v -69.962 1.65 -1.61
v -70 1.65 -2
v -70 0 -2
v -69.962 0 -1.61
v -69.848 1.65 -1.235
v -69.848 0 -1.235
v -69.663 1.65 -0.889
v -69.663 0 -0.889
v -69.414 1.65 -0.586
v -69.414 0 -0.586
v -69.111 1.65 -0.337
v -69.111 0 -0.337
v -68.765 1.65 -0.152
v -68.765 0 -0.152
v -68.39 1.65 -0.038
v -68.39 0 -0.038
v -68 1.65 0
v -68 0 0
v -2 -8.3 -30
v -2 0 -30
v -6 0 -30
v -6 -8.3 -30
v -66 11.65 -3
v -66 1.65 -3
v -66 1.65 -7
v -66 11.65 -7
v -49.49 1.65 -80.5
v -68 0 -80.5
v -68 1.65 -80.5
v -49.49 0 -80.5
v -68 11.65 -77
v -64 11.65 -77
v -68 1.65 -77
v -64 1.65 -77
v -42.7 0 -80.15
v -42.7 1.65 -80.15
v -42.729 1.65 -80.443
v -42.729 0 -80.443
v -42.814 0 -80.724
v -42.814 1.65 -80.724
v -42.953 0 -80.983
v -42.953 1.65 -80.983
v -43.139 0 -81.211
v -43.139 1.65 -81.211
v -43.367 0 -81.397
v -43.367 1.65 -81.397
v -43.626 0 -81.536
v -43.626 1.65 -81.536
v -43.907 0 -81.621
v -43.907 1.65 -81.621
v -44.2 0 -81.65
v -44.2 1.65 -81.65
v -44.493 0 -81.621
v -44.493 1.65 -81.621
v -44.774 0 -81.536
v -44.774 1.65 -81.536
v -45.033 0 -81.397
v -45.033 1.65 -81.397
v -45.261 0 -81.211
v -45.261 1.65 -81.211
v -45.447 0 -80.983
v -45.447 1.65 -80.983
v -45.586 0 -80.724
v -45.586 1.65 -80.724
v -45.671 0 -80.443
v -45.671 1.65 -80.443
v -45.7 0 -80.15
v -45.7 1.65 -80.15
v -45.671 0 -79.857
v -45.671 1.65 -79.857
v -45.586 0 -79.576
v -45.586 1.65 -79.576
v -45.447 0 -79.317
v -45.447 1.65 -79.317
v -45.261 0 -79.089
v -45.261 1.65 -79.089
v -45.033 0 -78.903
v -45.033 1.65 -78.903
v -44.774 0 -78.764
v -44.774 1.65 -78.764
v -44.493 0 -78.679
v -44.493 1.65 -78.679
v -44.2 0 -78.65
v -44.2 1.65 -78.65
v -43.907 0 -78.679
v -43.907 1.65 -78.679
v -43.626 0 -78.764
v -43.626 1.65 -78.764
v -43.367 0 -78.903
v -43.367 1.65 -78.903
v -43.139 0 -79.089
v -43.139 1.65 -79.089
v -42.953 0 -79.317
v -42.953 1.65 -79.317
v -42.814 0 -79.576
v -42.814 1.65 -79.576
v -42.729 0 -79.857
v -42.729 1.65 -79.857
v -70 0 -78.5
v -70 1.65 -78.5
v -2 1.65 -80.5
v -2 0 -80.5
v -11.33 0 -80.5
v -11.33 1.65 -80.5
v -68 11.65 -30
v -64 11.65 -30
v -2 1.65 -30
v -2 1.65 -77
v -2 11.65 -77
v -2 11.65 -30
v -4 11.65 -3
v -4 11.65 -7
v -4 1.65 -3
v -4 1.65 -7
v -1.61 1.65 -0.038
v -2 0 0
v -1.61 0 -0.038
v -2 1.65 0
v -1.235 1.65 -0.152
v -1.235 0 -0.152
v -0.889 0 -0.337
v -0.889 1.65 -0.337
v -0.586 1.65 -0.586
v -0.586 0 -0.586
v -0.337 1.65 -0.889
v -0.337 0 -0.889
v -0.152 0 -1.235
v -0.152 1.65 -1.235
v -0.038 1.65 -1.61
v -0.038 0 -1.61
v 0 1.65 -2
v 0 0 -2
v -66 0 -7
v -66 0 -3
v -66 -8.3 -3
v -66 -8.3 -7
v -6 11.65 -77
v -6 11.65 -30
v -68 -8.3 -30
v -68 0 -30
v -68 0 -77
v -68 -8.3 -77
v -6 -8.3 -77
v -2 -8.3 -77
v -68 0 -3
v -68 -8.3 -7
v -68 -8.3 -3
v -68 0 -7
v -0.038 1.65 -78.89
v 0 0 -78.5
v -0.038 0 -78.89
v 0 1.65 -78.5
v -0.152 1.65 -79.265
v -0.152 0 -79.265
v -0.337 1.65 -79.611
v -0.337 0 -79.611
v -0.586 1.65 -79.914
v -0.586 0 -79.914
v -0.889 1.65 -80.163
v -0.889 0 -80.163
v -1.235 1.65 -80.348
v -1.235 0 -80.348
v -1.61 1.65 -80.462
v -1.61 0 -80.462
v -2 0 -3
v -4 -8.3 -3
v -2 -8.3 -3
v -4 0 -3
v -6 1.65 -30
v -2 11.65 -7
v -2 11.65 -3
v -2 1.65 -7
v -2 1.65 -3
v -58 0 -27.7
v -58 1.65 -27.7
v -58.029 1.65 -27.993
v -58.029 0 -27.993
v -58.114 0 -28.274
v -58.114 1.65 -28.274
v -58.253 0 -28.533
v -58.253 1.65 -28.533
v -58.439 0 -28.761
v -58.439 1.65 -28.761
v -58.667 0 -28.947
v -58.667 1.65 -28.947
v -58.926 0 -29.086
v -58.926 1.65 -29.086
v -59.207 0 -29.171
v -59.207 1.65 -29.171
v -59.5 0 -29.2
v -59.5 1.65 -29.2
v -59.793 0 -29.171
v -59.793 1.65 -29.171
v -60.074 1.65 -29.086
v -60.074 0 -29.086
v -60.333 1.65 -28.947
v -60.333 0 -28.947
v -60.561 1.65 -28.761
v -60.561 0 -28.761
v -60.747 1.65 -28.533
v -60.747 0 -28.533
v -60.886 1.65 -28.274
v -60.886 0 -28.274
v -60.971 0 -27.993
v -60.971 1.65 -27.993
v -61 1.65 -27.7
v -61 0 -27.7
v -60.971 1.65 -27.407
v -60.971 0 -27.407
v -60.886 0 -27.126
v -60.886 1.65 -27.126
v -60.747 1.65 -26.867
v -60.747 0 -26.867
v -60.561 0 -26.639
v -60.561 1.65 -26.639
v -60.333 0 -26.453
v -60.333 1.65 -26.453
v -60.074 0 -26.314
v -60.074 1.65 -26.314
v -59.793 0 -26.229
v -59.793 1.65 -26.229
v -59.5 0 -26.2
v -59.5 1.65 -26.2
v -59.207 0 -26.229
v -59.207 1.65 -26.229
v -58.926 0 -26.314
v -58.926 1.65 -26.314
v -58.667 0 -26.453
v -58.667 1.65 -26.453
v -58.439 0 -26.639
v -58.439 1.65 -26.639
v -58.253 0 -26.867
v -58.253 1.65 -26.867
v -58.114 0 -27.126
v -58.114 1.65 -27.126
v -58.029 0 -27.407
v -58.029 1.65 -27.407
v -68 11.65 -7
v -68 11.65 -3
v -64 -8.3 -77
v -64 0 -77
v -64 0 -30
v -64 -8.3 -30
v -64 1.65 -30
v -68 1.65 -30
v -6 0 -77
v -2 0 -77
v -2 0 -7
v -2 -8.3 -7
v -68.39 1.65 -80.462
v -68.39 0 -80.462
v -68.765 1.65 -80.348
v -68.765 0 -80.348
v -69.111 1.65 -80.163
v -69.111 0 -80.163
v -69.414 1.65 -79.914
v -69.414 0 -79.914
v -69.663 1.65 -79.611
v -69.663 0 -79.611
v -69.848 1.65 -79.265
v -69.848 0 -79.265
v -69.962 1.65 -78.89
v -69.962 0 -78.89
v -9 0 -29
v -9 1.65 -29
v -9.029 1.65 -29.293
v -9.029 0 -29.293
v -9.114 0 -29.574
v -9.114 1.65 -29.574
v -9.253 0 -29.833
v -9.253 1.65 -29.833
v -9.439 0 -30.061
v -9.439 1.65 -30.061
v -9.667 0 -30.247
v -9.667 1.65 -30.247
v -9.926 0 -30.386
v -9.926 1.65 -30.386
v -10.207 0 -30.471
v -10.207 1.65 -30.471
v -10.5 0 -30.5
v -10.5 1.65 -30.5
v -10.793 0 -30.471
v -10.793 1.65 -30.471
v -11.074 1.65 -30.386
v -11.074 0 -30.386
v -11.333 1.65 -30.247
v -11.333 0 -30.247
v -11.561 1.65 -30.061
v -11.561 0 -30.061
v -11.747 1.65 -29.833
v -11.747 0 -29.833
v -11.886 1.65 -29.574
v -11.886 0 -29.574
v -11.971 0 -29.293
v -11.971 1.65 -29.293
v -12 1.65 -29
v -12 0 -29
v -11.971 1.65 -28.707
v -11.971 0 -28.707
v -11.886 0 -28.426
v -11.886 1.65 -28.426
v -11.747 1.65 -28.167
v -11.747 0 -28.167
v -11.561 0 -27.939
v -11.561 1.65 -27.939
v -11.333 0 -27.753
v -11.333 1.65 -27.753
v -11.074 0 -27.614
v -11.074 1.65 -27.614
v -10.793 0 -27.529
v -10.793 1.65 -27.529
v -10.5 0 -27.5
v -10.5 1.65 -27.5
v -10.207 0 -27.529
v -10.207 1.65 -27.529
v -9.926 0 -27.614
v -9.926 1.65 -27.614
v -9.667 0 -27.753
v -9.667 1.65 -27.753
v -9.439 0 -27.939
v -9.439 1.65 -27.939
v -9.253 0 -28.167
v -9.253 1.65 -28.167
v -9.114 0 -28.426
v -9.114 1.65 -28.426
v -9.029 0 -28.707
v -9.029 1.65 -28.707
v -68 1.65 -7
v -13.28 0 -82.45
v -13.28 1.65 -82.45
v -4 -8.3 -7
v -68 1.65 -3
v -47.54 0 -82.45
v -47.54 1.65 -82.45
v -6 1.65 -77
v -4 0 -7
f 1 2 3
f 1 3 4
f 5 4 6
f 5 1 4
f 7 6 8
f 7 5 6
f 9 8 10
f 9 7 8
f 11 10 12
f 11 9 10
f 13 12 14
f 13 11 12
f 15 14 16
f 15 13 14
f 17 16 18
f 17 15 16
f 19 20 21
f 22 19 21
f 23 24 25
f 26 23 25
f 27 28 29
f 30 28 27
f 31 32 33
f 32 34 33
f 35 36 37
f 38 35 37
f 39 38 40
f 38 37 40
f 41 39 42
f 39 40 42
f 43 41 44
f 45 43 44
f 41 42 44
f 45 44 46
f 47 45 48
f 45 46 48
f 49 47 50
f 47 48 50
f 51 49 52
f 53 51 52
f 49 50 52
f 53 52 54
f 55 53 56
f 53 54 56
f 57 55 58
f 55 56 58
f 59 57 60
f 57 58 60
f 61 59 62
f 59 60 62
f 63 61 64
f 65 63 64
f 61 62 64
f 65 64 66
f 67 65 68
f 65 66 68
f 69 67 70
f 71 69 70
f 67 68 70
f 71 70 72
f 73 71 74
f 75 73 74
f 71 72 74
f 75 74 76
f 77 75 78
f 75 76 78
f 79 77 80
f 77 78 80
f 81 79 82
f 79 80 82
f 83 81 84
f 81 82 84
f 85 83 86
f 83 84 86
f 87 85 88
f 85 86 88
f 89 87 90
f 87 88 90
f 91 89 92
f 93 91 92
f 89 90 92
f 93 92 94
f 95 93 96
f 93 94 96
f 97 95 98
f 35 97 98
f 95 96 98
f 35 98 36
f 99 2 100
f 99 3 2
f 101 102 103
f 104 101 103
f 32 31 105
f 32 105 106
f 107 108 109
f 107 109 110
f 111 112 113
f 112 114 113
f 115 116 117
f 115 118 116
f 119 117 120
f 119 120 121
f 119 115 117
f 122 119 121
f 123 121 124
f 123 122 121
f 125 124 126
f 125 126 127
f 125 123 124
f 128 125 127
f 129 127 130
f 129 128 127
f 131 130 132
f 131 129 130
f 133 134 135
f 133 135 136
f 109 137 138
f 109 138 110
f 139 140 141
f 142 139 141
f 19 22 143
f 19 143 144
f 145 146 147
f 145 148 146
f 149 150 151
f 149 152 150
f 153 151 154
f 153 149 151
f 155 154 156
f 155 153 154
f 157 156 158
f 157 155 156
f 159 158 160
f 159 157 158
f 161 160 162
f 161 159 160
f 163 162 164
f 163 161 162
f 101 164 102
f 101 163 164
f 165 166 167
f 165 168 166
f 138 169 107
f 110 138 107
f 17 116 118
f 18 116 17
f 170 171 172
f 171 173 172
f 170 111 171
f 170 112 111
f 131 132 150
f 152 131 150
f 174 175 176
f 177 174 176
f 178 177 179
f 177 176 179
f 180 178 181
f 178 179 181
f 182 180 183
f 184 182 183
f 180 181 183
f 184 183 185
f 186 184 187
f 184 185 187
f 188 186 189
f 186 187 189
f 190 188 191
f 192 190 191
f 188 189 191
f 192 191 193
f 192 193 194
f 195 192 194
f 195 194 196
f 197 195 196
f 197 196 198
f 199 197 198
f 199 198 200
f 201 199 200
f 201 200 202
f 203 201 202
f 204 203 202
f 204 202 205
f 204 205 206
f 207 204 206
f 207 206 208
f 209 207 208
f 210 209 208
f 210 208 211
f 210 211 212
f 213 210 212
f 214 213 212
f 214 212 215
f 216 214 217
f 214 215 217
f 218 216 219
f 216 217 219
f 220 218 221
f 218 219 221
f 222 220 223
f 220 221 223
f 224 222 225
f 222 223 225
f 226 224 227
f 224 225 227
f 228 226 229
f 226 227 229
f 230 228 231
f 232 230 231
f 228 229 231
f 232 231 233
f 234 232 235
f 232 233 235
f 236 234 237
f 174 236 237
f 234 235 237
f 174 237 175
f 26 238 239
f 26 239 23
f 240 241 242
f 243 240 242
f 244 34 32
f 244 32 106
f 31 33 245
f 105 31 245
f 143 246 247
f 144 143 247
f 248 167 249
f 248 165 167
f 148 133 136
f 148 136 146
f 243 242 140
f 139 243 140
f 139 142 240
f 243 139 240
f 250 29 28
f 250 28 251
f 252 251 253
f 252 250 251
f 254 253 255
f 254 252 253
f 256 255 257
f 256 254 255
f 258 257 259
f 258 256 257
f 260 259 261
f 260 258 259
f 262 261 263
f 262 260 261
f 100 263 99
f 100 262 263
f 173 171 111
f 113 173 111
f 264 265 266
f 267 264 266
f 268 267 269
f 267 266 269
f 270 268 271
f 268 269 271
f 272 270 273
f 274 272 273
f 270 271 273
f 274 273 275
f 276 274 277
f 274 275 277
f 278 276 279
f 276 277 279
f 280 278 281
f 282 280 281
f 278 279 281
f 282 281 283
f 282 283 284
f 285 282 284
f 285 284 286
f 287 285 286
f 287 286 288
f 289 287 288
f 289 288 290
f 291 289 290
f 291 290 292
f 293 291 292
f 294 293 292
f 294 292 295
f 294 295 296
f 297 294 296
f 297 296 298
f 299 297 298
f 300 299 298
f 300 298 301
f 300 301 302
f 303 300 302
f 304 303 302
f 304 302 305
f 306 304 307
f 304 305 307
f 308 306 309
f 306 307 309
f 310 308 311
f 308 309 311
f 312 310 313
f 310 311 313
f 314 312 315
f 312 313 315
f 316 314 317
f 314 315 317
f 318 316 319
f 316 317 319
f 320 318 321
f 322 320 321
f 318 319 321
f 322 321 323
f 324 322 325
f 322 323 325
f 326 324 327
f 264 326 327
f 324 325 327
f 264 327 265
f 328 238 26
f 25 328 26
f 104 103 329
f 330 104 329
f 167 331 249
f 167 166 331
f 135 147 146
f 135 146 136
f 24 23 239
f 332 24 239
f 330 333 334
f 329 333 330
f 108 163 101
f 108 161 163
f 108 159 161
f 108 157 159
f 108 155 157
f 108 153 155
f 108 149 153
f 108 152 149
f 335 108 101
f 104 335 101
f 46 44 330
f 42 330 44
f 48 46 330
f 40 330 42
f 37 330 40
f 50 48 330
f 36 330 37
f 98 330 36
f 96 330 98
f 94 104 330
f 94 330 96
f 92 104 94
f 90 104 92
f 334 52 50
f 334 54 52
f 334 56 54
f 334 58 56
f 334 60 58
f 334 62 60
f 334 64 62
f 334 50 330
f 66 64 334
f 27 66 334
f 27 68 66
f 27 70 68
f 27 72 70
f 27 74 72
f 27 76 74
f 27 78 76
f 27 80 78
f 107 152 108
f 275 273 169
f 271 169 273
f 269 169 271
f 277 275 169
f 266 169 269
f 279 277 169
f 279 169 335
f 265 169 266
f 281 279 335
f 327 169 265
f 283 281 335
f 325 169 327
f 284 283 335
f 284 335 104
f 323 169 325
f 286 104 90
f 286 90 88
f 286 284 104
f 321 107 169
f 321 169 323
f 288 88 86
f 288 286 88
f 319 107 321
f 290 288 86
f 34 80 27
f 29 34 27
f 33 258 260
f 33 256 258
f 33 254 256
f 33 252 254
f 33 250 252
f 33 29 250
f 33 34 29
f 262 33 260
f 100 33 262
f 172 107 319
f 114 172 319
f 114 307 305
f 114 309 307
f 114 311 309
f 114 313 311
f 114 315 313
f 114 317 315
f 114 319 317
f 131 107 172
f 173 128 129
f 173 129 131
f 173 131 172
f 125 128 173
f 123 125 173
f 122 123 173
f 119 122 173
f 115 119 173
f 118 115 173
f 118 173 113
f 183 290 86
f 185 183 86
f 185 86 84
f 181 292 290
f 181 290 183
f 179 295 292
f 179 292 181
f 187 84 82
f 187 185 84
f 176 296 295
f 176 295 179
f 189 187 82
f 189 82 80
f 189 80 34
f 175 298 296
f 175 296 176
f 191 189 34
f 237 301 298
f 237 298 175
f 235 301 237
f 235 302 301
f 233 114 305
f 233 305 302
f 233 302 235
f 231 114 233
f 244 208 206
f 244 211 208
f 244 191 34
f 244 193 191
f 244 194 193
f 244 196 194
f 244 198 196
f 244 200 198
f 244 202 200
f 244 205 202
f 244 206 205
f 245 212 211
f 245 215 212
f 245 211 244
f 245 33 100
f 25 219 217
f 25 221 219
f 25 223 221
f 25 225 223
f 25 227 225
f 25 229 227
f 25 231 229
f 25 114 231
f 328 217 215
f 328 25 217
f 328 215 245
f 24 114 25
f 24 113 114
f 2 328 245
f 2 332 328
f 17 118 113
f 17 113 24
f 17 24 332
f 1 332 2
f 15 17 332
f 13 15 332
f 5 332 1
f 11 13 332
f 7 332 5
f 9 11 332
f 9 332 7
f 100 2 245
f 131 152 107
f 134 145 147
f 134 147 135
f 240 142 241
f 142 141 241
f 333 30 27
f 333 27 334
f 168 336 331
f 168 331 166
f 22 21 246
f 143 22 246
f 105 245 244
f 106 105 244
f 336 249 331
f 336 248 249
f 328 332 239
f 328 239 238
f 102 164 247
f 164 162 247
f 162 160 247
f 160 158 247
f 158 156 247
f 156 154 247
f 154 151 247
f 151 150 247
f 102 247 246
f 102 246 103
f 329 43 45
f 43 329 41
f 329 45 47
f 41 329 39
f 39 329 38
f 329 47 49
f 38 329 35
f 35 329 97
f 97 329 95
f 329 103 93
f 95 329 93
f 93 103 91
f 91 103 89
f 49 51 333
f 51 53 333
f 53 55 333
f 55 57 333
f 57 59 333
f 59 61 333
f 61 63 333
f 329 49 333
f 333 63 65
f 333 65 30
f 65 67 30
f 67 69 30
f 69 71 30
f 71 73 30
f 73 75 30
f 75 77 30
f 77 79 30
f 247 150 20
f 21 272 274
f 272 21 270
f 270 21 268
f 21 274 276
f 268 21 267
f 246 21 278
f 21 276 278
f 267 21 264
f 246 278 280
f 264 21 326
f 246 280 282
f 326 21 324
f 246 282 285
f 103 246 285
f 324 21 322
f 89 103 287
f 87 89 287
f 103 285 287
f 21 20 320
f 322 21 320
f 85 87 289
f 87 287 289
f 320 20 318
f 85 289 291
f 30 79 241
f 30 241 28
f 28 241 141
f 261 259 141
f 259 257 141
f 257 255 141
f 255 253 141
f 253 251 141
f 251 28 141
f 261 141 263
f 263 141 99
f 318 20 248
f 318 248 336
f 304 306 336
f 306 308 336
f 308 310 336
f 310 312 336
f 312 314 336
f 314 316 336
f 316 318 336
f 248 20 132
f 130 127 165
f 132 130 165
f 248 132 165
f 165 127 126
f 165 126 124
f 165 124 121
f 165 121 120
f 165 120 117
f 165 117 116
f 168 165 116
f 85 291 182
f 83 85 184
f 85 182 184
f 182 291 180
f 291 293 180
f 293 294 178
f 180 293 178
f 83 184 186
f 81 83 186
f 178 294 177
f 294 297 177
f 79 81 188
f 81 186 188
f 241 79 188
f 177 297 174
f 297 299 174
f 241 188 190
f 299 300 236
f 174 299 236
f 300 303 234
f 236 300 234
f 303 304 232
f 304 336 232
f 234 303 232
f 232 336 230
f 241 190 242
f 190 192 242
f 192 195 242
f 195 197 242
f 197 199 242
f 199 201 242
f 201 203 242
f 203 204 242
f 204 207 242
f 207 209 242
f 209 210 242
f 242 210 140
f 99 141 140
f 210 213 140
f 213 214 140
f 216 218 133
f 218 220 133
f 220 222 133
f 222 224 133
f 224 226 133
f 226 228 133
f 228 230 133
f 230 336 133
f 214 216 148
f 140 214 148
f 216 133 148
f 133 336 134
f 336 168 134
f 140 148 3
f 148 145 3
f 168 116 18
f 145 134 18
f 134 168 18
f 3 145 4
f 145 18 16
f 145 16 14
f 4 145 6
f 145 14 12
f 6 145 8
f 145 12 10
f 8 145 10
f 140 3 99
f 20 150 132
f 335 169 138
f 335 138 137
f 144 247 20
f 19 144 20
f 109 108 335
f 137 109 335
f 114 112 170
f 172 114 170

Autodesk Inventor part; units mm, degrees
ref_plane "YZ Plane" through (0, 0, 0) normal (1, 0, 0) x (0, 1, 0)
ref_plane "XZ Plane" through (0, 0, 0) normal (0, 1, 0) x (-1, 0, 0)
ref_plane "XY Plane" through (0, 0, 0) normal (0, 0, 1) x (1, 0, 0)
sketch "Sketch1" plane through (0, 0, 0) normal (0, 1, 0) x (-1, 0, 0)
  line L0 (0, 0) -> (70, 0)
  line L1 (70, 0) -> (70, -80.5)
  line L2 (70, -80.5) -> (49.49, -80.5)
  line L3 (0, 0) -> (0, -80.5)
  line L4 (0, -80.5) -> (11.33, -80.5)
  line L5 (47.54, -82.45) -> (13.28, -82.45)
  line L6 (49.49, -80.5) -> (47.54, -82.45)
  line L7 (11.33, -80.5) -> (13.28, -82.45)
  dimension "d0" = 70
  dimension "d1" = 80.5
  dimension "d2" = 20.51
  dimension "d3" = 80.5
  dimension "d4" = 11.33
  dimension "d5" = 82.45
  dimension "d6" = 45
  dimension "d7" = 45
extrude "Extrusion1" add sketch "Sketch1" along normal blind 1.65
fillet "Fillet1" radius 2 4 edges at (0, 0.825, 0) (-70, 0.825, 0) (0, 0.825, -80.5) (-70, 0.825, -80.5)
sketch "Sketch2" plane through (0, 1.65, 0) normal (0, 1, 0) x (1, 0, 0)
  circle A0 centre (-59.5, 27.7) radius 1.5
  circle A1 centre (-10.5, 29) radius 1.5
  circle A2 centre (-44.2, 80.15) radius 1.5
  line L0 (-68, 0) -> (-2, 0) projected
  line L1 (0, 2) -> (0, 78.5) projected
  line L2 (-70, 78.5) -> (-70, 2) projected
  line L3 (-13.28, 82.45) -> (-47.54, 82.45) projected
  point P0 (0, 0)
  dimension "d11" = 3
  dimension "d12" = 3
  dimension "d13" = 3
  dimension "d14" = 29
  dimension "d15" = 10.5
  dimension "d16" = 10.5
  dimension "d17" = 2.3
  dimension "d18" = 25.8
  dimension "d40" = 27.7
extrude "Extrusion2" cut sketch "Sketch2" against normal through all
sketch "Sketch3" plane through (0, 0, 0) normal (0, -1, 0) x (1, 0, 0)
  line L0 (-2, -30) -> (-6, -30)
  line L1 (-6, -30) -> (-6, -77)
  line L2 (-6, -77) -> (-2, -77)
  line L3 (-2, -77) -> (-2, -30)
  line L4 (-68, 0) -> (-2, 0) projected
  line L5 (0, -2) -> (0, -78.5) projected
  line L6 (-64, -30) -> (-68, -30)
  line L7 (-68, -30) -> (-68, -77)
  line L8 (-68, -77) -> (-64, -77)
  line L9 (-64, -77) -> (-64, -30)
  line L10 (-70, -78.5) -> (-70, -2) projected
  line L11 (-49.49, -80.5) -> (-68, -80.5) projected
  line L12 (-2, -7) -> (-4, -7)
  line L13 (-4, -7) -> (-4, -3)
  line L14 (-4, -3) -> (-2, -3)
  line L15 (-2, -3) -> (-2, -7)
  line L16 (-66, -7) -> (-68, -7)
  line L17 (-68, -7) -> (-68, -3)
  line L18 (-68, -3) -> (-66, -3)
  line L19 (-66, -3) -> (-66, -7)
  point P0 (0, 0)
  point P1 (-4, -77)
  point P2 (-66, -77)
  point P3 (-2, -5)
  point P4 (-68, -5)
  point P5 (-3, -3)
  point P6 (-67, -3)
  dimension "d21" = 4
  dimension "d22" = 47
  dimension "d23" = 30
  dimension "d24" = 2
  dimension "d27" = 2
  dimension "d28" = 4
  dimension "d30" = 30
  dimension "d33" = 2
  dimension "d34" = 4
  dimension "d35" = 2
  dimension "d36" = 4
  dimension "d37" = 3
extrude "Extrusion3" add sketch "Sketch3" along normal blind 8.3
sketch "Sketch4" plane through (0, 1.65, 0) normal (0, 1, 0) x (1, 0, 0)
  line L0 (-2, 77) -> (-2, 30) projected
  line L1 (-6, 30) -> (-6, 77) projected
  line L2 (-2, 77) -> (-6, 77)
  line L3 (-6, 77) -> (-6, 30)
  line L4 (-6, 30) -> (-2, 30)
  line L5 (-2, 30) -> (-2, 77)
  line L6 (-64, 77) -> (-64, 30) projected
  line L7 (-68, 77) -> (-68, 30) projected
  line L8 (-64, 77) -> (-68, 77)
  line L9 (-68, 77) -> (-68, 30)
  line L10 (-68, 30) -> (-64, 30)
  line L11 (-64, 30) -> (-64, 77)
  line L12 (-66, 3) -> (-66, 7) projected
  line L13 (-68, 3) -> (-68, 7) projected
  line L14 (-66, 3) -> (-68, 3)
  line L15 (-68, 3) -> (-68, 7)
  line L16 (-68, 7) -> (-66, 7)
  line L17 (-66, 7) -> (-66, 3)
  line L18 (-2, 3) -> (-2, 7) projected
  line L19 (-4, 7) -> (-4, 3) projected
  line L20 (-2, 3) -> (-4, 3)
  line L21 (-4, 3) -> (-4, 7)
  line L22 (-4, 7) -> (-2, 7)
  line L23 (-2, 7) -> (-2, 3)
  point P0 (0, 0)
extrude "Extrusion4" add sketch "Sketch4" along normal blind 10
properties part number "Microcontroller"
